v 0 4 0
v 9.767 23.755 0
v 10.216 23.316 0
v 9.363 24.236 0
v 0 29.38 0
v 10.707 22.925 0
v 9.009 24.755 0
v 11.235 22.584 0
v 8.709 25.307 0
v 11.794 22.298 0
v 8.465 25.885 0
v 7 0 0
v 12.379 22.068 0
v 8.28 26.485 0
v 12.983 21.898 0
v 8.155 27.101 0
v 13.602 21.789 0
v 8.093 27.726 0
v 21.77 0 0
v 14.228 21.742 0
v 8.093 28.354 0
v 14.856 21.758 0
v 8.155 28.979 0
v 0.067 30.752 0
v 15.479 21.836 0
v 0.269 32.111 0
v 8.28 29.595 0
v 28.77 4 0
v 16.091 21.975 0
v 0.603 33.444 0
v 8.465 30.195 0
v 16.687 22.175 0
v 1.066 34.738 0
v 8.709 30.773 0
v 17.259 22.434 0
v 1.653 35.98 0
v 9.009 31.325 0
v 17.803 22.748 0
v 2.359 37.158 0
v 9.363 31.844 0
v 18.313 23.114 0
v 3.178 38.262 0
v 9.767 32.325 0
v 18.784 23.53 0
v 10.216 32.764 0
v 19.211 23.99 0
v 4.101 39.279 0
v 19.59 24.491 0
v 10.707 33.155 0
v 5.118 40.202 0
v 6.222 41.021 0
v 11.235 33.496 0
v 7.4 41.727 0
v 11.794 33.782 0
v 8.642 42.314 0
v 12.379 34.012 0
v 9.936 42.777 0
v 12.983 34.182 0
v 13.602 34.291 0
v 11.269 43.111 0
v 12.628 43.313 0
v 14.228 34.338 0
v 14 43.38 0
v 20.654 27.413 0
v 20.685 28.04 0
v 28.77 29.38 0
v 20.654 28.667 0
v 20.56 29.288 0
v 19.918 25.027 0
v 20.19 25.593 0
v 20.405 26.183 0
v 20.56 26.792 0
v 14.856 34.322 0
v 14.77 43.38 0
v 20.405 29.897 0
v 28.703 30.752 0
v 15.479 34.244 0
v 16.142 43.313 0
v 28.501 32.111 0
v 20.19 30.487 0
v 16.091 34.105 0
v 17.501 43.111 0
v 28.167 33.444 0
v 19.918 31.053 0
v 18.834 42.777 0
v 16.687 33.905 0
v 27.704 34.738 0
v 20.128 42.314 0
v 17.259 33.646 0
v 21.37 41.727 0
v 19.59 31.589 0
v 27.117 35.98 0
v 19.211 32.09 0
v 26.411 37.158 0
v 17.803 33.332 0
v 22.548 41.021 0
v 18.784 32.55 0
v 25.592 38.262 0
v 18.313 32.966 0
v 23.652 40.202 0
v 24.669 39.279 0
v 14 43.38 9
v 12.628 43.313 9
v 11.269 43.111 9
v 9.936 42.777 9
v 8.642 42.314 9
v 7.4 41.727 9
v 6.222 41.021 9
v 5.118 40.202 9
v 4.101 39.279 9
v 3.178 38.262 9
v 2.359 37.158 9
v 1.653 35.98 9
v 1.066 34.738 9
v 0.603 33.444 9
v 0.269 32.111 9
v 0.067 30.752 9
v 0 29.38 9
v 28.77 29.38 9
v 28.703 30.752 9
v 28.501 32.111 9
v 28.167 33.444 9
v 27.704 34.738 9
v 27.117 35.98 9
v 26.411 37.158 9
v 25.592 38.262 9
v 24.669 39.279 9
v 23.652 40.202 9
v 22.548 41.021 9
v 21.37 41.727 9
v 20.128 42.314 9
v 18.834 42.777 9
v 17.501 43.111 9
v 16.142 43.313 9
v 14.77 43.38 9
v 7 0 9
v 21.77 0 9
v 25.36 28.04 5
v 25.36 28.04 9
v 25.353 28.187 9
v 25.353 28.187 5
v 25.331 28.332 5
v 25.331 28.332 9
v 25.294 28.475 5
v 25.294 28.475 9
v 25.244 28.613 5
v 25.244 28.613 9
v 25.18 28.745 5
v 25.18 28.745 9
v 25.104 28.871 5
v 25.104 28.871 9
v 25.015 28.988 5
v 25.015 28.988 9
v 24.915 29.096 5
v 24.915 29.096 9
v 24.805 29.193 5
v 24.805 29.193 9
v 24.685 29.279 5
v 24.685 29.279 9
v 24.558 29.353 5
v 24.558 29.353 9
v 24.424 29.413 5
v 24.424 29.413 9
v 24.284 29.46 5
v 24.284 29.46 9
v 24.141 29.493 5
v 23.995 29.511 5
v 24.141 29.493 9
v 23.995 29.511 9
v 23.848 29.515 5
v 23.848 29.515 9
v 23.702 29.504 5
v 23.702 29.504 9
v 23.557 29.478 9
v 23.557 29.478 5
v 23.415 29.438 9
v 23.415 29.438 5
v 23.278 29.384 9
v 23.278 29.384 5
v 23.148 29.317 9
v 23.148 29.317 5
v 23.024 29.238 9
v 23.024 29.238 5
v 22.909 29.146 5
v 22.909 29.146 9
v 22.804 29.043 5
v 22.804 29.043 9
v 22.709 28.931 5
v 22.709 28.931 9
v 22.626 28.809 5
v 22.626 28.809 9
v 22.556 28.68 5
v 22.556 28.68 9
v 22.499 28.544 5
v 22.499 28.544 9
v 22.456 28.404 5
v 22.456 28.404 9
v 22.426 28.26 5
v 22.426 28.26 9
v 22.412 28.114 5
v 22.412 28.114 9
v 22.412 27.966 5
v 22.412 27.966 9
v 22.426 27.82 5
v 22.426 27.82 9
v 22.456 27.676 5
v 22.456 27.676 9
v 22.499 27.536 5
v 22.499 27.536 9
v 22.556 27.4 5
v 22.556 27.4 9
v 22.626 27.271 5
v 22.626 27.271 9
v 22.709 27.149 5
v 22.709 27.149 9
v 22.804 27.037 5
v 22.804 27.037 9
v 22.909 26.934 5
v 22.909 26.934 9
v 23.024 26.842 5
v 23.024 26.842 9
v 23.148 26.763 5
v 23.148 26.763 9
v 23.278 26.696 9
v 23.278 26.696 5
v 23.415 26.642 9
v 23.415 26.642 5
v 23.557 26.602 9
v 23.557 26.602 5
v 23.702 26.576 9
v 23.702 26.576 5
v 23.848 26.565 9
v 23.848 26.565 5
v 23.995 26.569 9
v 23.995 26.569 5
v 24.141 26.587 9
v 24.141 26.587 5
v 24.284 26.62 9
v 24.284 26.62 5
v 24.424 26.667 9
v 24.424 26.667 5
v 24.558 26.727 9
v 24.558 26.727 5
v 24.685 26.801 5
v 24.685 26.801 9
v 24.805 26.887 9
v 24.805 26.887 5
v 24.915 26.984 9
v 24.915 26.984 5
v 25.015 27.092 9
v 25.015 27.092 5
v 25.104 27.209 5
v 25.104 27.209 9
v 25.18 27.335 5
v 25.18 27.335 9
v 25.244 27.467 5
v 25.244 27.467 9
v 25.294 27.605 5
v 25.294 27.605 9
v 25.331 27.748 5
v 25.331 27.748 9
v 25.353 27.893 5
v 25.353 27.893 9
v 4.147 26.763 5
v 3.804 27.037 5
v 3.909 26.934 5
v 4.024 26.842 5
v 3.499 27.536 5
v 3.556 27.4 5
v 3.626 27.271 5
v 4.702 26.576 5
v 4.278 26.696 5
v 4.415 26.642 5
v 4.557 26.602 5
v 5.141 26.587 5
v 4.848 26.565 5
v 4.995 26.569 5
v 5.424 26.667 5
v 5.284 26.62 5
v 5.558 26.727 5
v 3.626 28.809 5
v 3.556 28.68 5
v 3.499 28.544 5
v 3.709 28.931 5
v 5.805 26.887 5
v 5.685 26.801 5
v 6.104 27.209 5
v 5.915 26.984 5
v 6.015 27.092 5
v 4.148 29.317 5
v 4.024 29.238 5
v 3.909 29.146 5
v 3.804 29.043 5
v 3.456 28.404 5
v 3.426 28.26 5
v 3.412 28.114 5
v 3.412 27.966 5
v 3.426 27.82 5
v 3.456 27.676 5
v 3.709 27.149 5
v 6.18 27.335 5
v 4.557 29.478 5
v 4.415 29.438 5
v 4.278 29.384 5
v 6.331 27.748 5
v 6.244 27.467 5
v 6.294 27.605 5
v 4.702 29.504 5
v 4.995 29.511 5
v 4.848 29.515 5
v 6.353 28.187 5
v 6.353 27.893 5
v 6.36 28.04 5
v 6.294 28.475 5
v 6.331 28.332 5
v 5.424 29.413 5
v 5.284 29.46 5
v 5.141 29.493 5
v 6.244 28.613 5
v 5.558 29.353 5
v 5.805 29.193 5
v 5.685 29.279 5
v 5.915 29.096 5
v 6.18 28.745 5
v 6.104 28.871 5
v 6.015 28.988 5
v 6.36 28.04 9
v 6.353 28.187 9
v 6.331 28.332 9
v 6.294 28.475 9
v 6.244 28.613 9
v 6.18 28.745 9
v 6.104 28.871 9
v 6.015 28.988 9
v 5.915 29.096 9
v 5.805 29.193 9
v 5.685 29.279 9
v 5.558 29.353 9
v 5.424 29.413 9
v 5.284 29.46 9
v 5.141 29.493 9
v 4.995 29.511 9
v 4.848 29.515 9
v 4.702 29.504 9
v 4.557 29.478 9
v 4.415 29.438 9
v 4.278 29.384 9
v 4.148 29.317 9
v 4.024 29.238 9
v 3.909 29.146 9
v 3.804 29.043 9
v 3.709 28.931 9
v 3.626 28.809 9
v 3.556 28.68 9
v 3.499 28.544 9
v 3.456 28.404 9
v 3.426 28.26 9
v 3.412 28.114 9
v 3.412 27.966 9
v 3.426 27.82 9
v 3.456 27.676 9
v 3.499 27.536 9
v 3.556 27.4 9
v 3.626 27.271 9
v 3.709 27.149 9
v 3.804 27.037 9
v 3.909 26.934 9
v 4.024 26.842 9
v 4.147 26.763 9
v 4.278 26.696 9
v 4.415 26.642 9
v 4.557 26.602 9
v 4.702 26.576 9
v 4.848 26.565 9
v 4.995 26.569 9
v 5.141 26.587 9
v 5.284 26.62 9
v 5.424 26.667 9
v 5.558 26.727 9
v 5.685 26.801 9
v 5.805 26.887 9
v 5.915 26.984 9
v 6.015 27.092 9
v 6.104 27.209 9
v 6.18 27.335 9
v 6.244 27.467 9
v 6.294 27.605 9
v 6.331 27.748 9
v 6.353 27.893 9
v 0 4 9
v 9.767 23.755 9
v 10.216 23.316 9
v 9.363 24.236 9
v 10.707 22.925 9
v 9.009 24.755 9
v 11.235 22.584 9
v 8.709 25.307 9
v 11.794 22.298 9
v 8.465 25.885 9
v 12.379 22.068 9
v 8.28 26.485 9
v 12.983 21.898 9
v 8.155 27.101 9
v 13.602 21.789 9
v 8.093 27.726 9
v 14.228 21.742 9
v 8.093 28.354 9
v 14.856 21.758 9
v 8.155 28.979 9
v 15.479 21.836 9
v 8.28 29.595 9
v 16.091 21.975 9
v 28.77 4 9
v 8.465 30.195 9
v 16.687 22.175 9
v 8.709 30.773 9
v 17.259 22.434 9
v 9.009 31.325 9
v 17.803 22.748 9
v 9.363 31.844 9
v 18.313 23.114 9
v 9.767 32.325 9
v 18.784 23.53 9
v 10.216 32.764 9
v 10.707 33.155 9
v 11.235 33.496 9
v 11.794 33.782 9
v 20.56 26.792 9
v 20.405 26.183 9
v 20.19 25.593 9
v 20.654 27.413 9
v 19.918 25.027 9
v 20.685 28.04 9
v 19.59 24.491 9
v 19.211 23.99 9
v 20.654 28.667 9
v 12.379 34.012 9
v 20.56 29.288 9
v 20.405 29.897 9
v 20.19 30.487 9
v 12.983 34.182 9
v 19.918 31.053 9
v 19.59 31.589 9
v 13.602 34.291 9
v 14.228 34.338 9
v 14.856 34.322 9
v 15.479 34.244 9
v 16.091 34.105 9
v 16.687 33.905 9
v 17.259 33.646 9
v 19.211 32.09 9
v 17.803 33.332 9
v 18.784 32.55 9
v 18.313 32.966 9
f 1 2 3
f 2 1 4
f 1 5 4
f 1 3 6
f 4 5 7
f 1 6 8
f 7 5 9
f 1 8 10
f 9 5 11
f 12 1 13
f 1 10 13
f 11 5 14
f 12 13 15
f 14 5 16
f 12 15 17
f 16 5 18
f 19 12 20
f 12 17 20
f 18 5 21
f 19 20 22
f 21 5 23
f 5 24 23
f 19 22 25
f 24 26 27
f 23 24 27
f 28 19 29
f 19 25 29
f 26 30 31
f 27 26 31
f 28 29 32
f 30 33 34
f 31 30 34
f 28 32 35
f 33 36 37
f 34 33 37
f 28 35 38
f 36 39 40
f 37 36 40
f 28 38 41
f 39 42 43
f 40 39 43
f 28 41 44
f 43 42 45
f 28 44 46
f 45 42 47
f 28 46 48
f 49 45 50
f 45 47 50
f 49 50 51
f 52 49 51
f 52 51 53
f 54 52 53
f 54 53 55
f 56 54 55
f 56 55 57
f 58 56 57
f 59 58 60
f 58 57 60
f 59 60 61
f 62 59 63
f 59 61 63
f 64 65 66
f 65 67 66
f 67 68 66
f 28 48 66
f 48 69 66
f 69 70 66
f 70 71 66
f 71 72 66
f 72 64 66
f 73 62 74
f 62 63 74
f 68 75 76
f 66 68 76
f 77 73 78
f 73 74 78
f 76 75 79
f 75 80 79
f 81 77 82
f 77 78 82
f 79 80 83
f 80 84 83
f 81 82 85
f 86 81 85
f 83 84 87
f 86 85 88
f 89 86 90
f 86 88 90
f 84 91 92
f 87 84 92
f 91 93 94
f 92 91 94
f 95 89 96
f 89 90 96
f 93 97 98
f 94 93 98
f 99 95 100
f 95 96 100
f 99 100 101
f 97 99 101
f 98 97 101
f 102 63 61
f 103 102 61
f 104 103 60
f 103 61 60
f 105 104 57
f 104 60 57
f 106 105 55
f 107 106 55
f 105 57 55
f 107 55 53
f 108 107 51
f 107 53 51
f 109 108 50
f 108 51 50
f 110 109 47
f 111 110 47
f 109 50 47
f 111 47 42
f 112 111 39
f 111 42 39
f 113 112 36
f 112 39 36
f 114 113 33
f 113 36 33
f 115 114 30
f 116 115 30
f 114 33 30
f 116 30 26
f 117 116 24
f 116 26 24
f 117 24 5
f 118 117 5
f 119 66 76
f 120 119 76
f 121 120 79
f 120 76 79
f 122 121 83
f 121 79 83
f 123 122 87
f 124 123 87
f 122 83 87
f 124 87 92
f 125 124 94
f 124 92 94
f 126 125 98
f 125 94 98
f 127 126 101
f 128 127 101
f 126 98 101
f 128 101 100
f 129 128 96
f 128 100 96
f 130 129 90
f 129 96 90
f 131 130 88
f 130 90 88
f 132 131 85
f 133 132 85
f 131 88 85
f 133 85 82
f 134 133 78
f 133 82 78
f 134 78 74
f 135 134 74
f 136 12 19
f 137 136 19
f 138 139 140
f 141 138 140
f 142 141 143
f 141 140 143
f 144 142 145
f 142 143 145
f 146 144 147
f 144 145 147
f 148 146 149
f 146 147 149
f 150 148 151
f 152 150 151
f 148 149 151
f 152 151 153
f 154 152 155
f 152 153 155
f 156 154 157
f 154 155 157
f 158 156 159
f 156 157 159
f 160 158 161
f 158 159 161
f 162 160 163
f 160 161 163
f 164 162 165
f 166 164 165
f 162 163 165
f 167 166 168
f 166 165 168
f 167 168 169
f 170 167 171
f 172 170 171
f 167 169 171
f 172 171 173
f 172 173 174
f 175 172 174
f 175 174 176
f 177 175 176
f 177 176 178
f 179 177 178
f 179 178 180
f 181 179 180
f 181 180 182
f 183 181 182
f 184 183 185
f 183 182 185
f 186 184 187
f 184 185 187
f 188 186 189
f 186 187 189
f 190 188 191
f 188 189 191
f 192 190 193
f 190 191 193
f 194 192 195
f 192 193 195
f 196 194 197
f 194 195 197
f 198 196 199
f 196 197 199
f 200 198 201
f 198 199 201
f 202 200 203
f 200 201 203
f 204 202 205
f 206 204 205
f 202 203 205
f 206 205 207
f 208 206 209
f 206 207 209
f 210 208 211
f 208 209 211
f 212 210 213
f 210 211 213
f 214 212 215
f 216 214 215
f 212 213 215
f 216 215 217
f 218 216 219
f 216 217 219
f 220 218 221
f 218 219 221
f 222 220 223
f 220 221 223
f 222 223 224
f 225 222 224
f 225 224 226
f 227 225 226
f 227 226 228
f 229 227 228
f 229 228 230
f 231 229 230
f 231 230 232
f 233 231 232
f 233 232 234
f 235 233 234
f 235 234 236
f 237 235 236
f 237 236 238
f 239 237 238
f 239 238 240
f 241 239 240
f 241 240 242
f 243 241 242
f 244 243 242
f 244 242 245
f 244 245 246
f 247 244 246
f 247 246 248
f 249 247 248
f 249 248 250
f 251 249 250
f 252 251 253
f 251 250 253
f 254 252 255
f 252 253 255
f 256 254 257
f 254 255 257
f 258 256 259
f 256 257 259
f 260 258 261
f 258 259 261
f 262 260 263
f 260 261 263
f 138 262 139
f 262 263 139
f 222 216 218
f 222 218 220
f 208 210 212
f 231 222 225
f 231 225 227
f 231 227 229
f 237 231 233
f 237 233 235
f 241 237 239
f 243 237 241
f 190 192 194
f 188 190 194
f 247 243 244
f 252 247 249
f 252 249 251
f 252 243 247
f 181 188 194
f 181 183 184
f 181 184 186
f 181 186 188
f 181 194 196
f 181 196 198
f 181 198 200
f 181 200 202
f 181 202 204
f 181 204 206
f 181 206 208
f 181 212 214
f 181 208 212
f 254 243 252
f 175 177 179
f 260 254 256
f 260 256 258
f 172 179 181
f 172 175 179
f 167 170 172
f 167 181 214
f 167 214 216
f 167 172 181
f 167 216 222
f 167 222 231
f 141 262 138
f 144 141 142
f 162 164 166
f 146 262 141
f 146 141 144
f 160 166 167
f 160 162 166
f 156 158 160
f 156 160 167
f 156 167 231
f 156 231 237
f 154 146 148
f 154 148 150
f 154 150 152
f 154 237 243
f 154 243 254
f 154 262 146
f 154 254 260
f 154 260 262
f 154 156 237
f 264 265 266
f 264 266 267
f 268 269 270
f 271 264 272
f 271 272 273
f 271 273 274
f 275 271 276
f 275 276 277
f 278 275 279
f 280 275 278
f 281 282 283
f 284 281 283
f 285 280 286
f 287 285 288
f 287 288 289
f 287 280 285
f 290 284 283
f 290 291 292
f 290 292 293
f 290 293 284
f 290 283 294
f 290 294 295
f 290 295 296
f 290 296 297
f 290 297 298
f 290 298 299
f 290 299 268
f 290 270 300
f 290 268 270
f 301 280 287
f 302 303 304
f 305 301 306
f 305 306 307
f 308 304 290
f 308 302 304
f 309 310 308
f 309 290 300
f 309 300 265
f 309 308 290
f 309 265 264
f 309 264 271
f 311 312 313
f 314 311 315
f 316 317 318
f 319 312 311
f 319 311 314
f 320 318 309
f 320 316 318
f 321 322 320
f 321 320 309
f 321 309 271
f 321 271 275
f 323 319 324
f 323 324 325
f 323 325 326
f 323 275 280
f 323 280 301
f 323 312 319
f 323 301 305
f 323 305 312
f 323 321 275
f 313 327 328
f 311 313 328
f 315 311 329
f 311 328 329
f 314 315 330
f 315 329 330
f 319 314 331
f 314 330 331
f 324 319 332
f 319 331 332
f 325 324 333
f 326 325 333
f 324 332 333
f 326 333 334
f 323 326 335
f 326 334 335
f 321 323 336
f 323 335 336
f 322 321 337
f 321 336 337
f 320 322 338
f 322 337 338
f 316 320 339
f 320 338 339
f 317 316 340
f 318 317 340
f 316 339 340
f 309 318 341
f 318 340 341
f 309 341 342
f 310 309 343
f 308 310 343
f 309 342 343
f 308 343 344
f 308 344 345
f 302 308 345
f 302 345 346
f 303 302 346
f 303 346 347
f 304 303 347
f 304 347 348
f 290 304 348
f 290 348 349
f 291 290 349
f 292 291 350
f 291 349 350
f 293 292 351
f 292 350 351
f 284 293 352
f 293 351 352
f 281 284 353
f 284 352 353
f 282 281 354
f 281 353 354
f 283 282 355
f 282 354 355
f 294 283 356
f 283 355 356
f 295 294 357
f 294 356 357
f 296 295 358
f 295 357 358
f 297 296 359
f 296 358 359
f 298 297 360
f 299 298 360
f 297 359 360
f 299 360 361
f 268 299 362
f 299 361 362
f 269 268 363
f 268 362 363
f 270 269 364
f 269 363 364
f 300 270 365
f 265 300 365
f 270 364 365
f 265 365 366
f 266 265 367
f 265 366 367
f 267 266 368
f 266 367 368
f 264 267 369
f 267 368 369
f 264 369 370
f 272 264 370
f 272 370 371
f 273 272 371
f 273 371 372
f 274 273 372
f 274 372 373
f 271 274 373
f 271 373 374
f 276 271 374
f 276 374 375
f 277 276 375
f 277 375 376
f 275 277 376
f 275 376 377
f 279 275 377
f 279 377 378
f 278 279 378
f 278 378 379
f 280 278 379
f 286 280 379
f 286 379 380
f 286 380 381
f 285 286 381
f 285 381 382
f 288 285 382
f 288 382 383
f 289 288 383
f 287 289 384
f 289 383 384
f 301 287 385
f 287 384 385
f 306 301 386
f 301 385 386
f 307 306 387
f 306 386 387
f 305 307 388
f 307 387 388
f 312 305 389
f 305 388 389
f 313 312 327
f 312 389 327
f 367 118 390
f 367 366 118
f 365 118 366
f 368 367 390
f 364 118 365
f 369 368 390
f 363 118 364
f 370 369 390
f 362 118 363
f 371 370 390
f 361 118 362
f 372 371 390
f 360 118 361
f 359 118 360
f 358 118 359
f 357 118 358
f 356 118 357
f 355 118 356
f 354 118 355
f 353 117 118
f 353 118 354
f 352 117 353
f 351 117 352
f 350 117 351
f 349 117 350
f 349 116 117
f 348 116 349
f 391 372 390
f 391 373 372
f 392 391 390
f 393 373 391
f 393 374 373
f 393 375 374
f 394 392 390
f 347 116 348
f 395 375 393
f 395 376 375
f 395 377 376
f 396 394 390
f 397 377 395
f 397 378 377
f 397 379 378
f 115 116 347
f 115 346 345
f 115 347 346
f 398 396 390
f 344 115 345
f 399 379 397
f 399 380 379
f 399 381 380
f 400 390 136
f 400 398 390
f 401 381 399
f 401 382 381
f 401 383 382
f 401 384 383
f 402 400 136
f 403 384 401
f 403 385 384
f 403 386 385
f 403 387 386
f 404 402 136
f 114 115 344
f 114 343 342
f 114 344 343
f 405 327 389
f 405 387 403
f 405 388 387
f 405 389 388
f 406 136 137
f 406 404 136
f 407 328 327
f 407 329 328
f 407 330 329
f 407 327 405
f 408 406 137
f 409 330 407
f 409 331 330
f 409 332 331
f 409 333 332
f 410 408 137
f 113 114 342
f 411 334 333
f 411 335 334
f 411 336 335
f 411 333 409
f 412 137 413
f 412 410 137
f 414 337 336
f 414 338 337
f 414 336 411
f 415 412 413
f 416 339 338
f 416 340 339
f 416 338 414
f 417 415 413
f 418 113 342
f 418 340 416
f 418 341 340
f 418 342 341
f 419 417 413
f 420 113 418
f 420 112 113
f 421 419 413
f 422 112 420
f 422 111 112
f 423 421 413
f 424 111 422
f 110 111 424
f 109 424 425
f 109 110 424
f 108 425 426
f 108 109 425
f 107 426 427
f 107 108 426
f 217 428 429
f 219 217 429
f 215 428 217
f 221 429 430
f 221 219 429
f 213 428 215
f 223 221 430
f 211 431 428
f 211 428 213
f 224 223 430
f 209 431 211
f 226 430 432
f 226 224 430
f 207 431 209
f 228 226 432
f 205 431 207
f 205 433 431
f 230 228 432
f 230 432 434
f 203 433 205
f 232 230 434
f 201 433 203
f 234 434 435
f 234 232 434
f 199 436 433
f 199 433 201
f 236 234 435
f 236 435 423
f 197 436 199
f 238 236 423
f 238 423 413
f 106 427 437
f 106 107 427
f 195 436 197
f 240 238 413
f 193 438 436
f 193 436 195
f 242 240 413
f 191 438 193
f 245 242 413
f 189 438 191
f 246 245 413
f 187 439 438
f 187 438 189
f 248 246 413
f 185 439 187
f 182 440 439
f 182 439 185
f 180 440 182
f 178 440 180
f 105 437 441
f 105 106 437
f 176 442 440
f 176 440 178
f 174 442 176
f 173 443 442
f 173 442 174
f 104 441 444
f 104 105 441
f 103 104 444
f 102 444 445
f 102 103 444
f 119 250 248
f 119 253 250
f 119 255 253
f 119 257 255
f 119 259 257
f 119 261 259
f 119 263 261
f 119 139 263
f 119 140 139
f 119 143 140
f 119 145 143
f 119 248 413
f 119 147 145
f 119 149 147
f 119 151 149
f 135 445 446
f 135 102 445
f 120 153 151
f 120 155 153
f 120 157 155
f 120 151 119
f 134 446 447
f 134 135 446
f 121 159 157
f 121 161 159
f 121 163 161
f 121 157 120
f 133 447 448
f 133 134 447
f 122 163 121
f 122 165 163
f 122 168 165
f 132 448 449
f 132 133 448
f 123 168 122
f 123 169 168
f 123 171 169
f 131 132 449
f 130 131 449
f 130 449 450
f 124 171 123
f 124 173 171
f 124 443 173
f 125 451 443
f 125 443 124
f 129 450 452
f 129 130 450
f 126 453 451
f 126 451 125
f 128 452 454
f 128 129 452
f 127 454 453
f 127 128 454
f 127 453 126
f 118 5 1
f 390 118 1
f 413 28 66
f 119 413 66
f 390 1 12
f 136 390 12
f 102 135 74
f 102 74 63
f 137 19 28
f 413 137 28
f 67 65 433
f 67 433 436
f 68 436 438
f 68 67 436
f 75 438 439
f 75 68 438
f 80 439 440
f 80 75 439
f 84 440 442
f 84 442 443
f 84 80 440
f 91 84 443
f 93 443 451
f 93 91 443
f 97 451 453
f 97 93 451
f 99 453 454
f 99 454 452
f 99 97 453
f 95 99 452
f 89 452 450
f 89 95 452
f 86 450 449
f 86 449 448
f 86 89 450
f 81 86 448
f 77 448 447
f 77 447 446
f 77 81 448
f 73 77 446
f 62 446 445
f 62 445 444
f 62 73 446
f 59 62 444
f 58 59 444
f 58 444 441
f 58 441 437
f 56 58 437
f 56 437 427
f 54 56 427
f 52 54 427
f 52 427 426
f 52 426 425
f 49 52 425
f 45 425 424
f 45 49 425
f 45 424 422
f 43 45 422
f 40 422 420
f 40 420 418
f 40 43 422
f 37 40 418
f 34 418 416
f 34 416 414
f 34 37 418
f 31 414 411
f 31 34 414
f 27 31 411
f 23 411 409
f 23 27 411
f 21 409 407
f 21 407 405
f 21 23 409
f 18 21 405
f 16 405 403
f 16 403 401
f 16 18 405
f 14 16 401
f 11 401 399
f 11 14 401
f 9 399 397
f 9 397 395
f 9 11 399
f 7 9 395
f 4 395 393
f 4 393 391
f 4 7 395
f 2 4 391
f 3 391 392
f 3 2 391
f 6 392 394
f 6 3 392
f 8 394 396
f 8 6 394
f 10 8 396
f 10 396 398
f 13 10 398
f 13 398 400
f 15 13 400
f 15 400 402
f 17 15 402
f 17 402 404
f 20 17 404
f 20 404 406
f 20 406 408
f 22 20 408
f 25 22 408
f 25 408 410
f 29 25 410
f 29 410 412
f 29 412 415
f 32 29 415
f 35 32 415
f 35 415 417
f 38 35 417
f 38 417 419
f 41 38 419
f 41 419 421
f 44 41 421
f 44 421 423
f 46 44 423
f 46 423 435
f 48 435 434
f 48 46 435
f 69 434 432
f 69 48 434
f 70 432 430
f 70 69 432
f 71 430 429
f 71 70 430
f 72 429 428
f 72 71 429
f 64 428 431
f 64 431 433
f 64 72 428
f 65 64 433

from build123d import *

# Parameters (mm, degrees)
SKETCH2_R           = 6.3
BOSS_EXTRUDE1_DEPTH = 9
SKETCH3_R           = 1.475
CUT_EXTRUDE1_DEPTH  = 4


with BuildPart() as part:
    # Sketch2 → Boss-Extrude1 (new body)
    with BuildSketch(Plane.XY):
        with BuildLine():
            Line((0, 4), (7, 0))
            Line((7, 0), (21.77, 0))
            Line((21.77, 0), (28.77, 4))
            Line((28.77, 4), (28.77, 29.38))
            ThreePointArc((28.77, 29.38), (24.669494937, 39.279494937), (14.77, 43.38))
            Line((14.77, 43.38), (14, 43.38))
            ThreePointArc((14, 43.38), (4.100505063, 39.279494937), (0, 29.38))
            Line((0, 29.38), (0, 4))
        make_face()
        with Locations((14.385, 28.04)):
            Circle(SKETCH2_R, mode=Mode.SUBTRACT)
    extrude(amount=BOSS_EXTRUDE1_DEPTH)

    # Sketch3 → Cut-Extrude1 (cut)
    with BuildSketch(Plane.XY.offset(9)):
        with Locations((4.885, 28.04)):
            Circle(SKETCH3_R)
        with Locations((23.885, 28.04)):
            Circle(SKETCH3_R)
    extrude(amount=-CUT_EXTRUDE1_DEPTH, mode=Mode.SUBTRACT)


solid = part.part
